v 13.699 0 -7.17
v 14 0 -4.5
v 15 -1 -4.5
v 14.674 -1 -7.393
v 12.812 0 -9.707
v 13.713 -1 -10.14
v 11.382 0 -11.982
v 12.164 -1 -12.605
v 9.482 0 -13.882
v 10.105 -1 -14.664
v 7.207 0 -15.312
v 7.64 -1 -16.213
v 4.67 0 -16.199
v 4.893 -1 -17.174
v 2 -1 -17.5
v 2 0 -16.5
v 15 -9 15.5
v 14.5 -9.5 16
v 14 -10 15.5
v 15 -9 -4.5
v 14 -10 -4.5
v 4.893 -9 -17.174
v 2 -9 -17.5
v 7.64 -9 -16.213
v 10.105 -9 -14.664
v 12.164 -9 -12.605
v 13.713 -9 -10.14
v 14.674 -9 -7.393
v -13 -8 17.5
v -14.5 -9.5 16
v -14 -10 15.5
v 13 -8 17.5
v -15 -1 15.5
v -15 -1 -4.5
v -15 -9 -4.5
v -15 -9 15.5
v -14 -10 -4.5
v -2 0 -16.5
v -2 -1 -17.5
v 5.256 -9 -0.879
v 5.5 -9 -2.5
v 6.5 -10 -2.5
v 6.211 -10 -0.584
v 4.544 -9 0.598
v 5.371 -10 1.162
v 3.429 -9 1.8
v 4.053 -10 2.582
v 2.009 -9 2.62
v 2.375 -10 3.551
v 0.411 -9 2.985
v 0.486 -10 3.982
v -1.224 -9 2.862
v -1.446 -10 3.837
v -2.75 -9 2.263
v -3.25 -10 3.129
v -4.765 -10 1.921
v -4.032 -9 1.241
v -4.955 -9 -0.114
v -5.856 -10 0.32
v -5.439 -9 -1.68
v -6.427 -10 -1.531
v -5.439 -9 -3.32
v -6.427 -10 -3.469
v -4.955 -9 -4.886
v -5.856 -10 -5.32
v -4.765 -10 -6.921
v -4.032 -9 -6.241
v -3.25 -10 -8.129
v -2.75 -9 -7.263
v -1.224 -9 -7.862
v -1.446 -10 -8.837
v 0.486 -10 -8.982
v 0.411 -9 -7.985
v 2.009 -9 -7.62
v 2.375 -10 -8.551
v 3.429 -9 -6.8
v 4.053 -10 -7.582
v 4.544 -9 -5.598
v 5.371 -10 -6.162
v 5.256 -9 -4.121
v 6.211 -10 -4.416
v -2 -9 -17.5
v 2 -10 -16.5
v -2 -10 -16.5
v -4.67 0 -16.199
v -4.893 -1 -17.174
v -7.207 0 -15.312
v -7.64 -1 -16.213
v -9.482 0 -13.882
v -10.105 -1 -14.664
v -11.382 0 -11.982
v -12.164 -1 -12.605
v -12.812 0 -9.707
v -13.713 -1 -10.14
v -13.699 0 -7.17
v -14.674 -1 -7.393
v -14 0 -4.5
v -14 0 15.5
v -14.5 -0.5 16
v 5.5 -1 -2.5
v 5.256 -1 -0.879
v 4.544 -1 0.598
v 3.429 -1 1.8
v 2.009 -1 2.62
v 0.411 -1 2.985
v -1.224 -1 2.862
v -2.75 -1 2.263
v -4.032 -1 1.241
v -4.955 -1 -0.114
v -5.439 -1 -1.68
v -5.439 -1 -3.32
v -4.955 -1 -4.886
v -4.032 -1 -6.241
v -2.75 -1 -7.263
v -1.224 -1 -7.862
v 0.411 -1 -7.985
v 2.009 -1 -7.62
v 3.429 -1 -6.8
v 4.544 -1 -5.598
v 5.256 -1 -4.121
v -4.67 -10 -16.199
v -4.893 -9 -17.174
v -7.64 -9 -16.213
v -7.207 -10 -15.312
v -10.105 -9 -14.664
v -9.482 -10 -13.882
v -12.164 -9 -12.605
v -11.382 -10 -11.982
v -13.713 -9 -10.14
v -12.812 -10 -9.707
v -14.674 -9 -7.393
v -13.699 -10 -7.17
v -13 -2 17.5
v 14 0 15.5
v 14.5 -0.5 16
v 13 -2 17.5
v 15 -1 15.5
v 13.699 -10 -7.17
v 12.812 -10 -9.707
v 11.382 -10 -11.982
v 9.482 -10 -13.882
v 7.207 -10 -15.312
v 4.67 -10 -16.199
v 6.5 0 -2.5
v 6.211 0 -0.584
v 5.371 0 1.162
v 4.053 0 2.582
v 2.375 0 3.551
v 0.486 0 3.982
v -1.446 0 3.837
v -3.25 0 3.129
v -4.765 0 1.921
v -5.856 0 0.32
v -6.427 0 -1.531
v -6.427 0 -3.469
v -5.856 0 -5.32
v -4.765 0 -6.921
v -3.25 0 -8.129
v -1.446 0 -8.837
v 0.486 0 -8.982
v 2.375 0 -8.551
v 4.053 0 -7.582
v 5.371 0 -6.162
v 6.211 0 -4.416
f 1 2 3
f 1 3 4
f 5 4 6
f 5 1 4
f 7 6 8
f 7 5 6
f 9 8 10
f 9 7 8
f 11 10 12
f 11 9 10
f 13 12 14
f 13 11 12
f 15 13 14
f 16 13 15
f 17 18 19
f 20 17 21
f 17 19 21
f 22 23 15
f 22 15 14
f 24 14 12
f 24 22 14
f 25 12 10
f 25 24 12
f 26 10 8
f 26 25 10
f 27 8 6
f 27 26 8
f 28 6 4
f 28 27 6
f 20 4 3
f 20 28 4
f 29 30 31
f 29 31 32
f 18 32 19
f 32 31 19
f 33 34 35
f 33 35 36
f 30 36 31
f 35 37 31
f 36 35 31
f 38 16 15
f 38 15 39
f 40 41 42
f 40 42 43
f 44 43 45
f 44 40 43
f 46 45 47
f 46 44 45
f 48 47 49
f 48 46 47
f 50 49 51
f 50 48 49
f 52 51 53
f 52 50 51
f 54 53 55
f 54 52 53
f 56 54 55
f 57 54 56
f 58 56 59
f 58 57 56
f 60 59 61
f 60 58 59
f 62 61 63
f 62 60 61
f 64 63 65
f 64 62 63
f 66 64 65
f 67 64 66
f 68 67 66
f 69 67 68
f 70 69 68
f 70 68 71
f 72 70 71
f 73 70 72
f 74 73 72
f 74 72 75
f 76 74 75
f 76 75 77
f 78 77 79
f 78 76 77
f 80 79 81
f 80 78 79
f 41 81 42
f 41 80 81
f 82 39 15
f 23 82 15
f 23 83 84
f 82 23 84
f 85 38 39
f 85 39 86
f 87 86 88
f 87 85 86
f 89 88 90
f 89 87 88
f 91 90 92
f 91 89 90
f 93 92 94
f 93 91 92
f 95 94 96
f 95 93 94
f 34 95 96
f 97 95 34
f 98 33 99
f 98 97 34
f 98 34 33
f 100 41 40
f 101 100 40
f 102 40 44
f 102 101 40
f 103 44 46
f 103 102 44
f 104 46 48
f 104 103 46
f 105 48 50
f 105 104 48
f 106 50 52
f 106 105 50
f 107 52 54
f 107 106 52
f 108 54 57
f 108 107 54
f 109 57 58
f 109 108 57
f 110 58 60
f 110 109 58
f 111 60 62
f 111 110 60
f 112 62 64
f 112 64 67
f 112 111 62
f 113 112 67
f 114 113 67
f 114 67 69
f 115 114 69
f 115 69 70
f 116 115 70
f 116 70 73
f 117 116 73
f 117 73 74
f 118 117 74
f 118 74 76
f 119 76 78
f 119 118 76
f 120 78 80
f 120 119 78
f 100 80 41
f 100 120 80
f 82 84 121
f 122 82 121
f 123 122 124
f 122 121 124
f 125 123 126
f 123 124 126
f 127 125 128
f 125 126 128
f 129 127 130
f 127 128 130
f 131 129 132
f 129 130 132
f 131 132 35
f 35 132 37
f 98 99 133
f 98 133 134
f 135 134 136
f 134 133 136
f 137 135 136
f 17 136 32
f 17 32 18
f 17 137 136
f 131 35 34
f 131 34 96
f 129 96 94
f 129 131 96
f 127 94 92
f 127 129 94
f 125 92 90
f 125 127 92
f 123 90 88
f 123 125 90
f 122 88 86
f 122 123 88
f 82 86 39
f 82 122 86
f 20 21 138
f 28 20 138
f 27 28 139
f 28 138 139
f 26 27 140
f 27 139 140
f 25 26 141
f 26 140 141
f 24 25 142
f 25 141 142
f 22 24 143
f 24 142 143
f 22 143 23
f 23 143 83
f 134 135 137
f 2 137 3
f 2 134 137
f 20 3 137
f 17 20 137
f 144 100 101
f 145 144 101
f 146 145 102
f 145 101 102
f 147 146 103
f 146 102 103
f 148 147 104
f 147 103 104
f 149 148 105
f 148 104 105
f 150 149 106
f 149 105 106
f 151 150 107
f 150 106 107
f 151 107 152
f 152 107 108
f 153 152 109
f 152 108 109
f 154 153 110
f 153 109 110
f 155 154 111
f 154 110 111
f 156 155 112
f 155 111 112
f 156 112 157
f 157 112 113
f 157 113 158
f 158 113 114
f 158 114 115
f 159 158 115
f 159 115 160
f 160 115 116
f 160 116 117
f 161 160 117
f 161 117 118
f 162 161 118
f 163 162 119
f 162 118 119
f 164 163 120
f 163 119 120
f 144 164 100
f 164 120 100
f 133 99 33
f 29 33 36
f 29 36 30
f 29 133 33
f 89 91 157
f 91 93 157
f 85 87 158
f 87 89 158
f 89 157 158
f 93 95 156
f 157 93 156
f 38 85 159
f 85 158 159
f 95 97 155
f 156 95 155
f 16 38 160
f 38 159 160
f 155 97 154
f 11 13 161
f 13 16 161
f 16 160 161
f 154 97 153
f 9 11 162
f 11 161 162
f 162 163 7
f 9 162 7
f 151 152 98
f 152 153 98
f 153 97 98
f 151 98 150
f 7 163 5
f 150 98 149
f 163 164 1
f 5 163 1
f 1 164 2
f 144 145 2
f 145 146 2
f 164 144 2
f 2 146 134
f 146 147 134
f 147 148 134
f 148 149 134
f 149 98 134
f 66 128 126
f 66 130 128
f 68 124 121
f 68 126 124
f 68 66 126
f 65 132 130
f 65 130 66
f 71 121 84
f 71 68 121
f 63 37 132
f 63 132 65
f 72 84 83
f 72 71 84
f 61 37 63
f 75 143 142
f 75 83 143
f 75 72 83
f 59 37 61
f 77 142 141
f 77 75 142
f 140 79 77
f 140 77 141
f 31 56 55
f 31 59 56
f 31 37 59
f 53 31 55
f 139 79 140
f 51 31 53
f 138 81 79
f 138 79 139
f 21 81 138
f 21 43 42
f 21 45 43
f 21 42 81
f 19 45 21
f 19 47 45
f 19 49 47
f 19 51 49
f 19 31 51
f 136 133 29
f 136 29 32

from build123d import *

# Parameters (mm, degrees)
F0_W     = 30
F0_H     = 35
F0_R     = 5.5
F1_DEPTH = 10
F2_R     = 13
F3_SIZE  = 2
F4_SIZE  = 1
F5_SIZE  = 1


with BuildPart() as f1:
    # F0 (on Front) → F1 (new body)
    with BuildSketch(Plane.XZ):
        Rectangle(F0_W, F0_H)
        with Locations((0, -2.5)):
            Circle(F0_R, mode=Mode.SUBTRACT)
    extrude(amount=F1_DEPTH)

    # F2
    f2_edges = [f1.edges().sort_by_distance(p)[0] for p in [
        (15, -5, -17.5),
        (-15, -5, -17.5),
    ]]
    fillet(f2_edges, radius=F2_R)

    # F3
    f3_edges = [f1.edges().sort_by_distance(p)[0] for p in [
        (15, -5, 17.5),
        (-15, -5, 17.5),
        (0, 0, 17.5),
        (0, -10, 17.5),
    ]]
    chamfer(f3_edges, length=F3_SIZE)

    # F4
    f4_edges = [f1.edges().sort_by_distance(p)[0] for p in [
        (-15, -10, 5.5),
        (-15, 0, 5.5),
    ]]
    chamfer(f4_edges, length=F4_SIZE)

    # F5
    f5_edges = [f1.edges().sort_by_distance(p)[0] for p in [
        (5.5, -5, -2.5),
        (-5.5, 0, -2.5),
        (-5.5, -10, -2.5),
    ]]
    chamfer(f5_edges, length=F5_SIZE)


solid = f1.part
